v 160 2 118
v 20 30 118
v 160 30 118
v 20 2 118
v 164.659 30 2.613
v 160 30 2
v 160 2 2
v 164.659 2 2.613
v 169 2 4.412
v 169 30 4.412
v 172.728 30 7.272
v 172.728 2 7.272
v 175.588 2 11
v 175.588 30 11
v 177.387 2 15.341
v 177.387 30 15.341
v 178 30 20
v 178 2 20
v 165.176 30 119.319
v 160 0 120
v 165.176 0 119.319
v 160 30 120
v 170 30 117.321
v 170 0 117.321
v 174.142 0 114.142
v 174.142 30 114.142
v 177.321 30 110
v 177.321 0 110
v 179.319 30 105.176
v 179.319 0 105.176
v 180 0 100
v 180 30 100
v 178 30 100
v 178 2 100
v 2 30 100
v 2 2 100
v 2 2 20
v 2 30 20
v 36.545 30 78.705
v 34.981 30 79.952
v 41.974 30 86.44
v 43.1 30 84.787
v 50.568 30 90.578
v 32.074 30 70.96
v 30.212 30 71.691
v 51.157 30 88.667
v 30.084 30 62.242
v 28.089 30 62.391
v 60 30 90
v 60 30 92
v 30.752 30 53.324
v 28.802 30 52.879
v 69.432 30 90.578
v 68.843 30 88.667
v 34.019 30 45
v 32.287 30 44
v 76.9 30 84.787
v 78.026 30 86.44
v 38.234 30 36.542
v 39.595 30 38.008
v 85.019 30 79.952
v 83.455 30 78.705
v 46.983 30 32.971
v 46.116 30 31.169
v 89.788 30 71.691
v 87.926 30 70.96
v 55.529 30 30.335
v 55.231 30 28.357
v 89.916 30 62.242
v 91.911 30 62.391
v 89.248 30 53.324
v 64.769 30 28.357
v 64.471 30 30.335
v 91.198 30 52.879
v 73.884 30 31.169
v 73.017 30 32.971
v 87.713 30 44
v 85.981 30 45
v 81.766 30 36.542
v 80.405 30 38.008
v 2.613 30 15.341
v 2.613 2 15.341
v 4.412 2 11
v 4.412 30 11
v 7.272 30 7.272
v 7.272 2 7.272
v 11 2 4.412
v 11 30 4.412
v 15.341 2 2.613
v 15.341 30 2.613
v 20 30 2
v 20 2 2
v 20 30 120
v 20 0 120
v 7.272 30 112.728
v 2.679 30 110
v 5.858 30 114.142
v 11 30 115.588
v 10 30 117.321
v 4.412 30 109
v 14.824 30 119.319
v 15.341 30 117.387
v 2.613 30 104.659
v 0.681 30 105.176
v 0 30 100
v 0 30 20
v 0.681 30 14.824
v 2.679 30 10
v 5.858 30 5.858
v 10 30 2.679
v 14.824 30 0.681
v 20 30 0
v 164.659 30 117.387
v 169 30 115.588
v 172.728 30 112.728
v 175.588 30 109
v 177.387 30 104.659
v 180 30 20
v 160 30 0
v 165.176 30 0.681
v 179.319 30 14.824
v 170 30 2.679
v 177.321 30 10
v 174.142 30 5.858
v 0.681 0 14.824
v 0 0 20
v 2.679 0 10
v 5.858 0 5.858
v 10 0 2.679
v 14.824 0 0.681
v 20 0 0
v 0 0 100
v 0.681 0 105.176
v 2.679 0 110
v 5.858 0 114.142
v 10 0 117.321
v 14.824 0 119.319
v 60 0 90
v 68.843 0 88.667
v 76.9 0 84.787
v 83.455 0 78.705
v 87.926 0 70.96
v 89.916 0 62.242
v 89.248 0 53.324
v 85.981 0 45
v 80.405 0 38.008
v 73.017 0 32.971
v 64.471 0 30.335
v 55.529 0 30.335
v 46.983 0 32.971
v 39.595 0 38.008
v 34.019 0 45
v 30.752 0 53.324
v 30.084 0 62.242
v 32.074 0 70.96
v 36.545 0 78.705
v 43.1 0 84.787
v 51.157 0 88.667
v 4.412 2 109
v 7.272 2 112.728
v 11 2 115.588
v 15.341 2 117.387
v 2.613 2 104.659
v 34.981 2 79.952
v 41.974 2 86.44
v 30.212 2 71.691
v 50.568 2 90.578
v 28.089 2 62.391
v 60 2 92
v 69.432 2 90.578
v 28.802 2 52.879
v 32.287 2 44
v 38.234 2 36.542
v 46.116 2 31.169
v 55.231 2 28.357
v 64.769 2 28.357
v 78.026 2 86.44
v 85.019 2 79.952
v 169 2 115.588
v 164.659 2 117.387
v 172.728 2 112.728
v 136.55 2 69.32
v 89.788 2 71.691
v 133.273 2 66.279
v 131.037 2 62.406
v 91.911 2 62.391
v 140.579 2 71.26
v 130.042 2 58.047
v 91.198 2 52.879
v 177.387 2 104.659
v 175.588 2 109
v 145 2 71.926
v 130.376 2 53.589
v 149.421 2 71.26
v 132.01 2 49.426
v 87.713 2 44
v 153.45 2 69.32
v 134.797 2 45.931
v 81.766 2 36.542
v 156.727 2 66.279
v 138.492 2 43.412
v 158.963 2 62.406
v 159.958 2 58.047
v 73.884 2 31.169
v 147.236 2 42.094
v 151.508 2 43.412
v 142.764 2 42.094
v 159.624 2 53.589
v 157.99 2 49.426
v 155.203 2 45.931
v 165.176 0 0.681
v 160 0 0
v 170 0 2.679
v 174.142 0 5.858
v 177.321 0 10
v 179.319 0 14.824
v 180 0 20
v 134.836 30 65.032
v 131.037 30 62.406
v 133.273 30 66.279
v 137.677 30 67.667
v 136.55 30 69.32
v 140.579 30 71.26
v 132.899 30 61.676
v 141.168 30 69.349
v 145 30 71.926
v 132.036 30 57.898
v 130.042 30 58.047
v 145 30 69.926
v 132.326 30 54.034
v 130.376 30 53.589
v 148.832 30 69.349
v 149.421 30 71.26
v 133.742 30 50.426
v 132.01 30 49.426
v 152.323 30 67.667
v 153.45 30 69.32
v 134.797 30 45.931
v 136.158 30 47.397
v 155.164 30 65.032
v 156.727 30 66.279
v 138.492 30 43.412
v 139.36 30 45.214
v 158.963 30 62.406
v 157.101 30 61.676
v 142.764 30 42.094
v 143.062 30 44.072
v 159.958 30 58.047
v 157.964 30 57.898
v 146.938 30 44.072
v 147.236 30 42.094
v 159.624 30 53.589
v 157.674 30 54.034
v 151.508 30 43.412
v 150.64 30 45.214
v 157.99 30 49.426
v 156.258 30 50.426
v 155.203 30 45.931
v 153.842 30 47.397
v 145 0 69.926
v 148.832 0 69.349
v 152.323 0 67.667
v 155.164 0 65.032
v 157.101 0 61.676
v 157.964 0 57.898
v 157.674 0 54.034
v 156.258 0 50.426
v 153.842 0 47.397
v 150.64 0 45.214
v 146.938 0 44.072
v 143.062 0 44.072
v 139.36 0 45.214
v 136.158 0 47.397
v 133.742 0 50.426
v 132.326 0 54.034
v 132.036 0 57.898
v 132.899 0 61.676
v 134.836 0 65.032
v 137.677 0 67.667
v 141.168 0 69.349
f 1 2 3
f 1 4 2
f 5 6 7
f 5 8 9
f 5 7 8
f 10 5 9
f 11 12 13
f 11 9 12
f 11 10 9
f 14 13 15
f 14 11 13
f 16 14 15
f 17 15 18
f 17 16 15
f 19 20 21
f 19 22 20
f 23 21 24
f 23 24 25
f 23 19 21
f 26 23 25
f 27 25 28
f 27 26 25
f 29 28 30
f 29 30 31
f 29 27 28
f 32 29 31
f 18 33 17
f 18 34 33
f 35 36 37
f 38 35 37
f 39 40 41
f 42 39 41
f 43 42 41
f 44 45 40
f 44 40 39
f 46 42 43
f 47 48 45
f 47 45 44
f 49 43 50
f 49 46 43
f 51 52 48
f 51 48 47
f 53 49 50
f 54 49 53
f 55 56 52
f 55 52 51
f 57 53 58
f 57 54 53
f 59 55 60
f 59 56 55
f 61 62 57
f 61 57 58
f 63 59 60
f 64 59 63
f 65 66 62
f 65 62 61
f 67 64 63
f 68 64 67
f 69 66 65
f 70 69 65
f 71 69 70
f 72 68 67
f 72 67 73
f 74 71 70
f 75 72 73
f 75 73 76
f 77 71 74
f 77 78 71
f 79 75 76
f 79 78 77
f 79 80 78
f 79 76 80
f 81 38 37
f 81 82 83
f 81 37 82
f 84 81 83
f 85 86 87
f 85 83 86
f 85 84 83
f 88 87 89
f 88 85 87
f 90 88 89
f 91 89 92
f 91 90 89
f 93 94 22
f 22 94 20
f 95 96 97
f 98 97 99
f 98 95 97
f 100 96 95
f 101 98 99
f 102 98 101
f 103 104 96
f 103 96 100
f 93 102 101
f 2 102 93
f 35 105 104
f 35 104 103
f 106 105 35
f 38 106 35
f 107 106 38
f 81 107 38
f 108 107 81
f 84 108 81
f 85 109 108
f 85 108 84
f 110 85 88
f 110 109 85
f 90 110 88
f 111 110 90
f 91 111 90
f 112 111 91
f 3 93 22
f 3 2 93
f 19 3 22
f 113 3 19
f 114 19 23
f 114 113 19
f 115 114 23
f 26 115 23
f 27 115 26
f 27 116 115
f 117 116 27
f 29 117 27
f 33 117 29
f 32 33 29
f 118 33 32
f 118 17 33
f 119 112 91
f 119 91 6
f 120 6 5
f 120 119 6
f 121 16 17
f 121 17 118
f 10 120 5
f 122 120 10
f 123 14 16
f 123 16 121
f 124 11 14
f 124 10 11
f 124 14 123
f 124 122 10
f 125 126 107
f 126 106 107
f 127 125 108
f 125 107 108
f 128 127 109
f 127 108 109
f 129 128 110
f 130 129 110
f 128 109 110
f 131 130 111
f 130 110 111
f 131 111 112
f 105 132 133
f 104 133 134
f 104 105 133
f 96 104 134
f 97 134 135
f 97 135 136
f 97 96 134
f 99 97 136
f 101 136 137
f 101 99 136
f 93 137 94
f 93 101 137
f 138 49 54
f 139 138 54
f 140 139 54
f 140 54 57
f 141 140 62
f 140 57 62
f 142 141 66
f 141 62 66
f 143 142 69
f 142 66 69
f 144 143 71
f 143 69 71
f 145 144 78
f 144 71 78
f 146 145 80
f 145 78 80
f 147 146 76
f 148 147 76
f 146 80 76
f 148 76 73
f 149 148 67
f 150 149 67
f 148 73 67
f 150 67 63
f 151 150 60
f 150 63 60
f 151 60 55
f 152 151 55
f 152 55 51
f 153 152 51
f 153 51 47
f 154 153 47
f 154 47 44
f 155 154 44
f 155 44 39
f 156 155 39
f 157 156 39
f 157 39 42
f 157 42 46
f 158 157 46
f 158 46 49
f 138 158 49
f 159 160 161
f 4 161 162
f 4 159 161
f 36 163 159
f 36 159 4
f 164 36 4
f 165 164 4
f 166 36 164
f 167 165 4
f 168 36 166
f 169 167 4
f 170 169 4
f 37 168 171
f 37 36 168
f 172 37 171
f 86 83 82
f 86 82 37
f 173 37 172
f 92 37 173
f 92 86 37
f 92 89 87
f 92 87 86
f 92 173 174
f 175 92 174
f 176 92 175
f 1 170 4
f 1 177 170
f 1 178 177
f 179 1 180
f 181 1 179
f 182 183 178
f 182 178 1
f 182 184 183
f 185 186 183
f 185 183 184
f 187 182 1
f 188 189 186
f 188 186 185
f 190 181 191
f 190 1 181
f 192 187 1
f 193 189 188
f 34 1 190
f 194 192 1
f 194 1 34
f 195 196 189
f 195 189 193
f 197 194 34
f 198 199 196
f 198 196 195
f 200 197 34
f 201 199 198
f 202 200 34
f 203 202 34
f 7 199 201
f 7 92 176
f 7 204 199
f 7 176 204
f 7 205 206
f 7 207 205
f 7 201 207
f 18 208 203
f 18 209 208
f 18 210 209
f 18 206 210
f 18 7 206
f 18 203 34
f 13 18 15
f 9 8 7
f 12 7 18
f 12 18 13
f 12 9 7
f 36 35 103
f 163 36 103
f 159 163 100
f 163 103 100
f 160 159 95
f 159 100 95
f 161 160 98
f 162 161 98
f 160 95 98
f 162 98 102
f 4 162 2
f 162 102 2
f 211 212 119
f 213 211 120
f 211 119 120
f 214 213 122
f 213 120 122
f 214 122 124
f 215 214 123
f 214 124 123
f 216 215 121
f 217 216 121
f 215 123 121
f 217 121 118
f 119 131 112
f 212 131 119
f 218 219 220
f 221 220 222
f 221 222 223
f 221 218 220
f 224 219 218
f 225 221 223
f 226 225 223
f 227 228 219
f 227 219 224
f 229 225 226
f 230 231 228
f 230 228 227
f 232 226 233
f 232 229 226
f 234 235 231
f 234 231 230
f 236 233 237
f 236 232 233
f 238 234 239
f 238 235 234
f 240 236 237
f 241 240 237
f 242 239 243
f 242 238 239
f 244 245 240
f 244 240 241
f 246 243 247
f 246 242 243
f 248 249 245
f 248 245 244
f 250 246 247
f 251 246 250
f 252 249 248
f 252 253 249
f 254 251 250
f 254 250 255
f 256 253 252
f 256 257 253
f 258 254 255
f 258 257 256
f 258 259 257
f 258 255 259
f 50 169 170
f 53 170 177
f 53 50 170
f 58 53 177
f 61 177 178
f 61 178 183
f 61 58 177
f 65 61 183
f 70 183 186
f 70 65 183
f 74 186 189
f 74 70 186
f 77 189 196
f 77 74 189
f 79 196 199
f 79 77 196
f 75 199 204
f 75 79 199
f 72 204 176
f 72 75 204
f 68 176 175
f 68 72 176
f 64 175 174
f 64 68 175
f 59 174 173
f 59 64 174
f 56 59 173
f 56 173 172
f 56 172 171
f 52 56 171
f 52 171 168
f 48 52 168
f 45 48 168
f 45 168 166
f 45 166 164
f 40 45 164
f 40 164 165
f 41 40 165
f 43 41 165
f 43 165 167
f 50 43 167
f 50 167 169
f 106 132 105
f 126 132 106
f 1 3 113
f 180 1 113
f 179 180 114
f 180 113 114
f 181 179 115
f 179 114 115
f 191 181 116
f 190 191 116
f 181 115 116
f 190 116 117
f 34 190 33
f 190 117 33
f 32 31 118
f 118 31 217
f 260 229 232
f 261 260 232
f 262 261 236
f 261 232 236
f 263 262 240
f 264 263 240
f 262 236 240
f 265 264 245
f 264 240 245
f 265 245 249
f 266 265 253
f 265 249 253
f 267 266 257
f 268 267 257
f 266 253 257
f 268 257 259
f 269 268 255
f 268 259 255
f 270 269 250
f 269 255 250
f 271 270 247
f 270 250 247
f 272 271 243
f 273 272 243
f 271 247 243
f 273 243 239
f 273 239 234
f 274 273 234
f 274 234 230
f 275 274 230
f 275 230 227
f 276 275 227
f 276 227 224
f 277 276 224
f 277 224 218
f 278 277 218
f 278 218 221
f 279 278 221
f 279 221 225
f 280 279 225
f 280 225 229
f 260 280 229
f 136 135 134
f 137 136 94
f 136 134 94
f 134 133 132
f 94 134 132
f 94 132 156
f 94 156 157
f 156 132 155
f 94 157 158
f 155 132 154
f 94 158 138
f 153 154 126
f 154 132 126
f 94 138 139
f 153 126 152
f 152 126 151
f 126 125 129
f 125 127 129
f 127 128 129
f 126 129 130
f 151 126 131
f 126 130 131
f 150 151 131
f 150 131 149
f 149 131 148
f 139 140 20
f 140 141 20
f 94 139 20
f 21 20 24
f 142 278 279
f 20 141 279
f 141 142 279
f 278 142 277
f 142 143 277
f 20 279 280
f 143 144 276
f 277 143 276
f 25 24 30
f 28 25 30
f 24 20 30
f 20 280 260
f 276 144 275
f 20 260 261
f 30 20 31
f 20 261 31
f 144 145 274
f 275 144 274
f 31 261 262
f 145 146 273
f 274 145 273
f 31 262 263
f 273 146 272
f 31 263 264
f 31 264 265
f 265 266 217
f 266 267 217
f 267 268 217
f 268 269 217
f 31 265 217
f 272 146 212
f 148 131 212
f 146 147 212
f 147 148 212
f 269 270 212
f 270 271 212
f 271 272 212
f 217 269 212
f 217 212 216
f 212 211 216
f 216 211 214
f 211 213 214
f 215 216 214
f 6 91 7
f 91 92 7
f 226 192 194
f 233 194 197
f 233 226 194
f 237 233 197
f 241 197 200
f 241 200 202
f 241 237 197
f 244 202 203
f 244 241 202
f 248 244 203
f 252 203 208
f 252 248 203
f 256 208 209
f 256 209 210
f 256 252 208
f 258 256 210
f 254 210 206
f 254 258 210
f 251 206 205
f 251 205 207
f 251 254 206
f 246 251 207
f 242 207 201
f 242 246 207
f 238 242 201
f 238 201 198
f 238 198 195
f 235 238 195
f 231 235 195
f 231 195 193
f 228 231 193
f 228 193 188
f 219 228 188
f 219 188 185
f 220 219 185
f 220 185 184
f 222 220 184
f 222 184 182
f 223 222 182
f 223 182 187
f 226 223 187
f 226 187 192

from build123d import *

# Parameters (mm, degrees)
SKETCH1_W           = 180
SKETCH1_H           = 120
BOSS_EXTRUDE1_DEPTH = 30
SKETCH4_R           = 30
SKETCH4_R_2         = 13
CUT_EXTRUDE1_DEPTH  = 219.403296678
FILLET1_R           = 20
SHELL2_T            = -2


with BuildPart() as part:
    # Sketch1 → Boss-Extrude1 (new body)
    with BuildSketch(Plane(origin=(0, 0, 0), x_dir=(1, 0, 0), z_dir=(0, 1, 0))):
        with Locations((90, -60)):
            Rectangle(SKETCH1_W, SKETCH1_H)
    extrude(amount=BOSS_EXTRUDE1_DEPTH)

    # Sketch4 → Cut-Extrude1 (cut, through all)
    with BuildSketch(Plane(origin=(0, 30, 0), x_dir=(1, 0, 0), z_dir=(0, 1, 0))):
        with Locations(Location((60, -60, 0), (0, 0, 270))):
            Circle(SKETCH4_R)
        with Locations(Location((145, -56.926363362, 0), (0, 0, 270))):
            Circle(SKETCH4_R_2)
    extrude(amount=-CUT_EXTRUDE1_DEPTH, mode=Mode.SUBTRACT)

    # Fillet1
    fillet1_edges = [part.edges().sort_by_distance(p)[0] for p in [
        (0, 15, 0),
        (180, 15, 0),
        (180, 15, 120),
        (0, 15, 120),
    ]]
    fillet(fillet1_edges, radius=FILLET1_R)

    # Shell2
    shell2_openings = [part.faces().sort_by_distance(p)[0] for p in [
        (93.107668166, 30, 60.091175454),
    ]]
    offset(amount=SHELL2_T, openings=shell2_openings, kind=Kind.INTERSECTION)


solid = part.part
